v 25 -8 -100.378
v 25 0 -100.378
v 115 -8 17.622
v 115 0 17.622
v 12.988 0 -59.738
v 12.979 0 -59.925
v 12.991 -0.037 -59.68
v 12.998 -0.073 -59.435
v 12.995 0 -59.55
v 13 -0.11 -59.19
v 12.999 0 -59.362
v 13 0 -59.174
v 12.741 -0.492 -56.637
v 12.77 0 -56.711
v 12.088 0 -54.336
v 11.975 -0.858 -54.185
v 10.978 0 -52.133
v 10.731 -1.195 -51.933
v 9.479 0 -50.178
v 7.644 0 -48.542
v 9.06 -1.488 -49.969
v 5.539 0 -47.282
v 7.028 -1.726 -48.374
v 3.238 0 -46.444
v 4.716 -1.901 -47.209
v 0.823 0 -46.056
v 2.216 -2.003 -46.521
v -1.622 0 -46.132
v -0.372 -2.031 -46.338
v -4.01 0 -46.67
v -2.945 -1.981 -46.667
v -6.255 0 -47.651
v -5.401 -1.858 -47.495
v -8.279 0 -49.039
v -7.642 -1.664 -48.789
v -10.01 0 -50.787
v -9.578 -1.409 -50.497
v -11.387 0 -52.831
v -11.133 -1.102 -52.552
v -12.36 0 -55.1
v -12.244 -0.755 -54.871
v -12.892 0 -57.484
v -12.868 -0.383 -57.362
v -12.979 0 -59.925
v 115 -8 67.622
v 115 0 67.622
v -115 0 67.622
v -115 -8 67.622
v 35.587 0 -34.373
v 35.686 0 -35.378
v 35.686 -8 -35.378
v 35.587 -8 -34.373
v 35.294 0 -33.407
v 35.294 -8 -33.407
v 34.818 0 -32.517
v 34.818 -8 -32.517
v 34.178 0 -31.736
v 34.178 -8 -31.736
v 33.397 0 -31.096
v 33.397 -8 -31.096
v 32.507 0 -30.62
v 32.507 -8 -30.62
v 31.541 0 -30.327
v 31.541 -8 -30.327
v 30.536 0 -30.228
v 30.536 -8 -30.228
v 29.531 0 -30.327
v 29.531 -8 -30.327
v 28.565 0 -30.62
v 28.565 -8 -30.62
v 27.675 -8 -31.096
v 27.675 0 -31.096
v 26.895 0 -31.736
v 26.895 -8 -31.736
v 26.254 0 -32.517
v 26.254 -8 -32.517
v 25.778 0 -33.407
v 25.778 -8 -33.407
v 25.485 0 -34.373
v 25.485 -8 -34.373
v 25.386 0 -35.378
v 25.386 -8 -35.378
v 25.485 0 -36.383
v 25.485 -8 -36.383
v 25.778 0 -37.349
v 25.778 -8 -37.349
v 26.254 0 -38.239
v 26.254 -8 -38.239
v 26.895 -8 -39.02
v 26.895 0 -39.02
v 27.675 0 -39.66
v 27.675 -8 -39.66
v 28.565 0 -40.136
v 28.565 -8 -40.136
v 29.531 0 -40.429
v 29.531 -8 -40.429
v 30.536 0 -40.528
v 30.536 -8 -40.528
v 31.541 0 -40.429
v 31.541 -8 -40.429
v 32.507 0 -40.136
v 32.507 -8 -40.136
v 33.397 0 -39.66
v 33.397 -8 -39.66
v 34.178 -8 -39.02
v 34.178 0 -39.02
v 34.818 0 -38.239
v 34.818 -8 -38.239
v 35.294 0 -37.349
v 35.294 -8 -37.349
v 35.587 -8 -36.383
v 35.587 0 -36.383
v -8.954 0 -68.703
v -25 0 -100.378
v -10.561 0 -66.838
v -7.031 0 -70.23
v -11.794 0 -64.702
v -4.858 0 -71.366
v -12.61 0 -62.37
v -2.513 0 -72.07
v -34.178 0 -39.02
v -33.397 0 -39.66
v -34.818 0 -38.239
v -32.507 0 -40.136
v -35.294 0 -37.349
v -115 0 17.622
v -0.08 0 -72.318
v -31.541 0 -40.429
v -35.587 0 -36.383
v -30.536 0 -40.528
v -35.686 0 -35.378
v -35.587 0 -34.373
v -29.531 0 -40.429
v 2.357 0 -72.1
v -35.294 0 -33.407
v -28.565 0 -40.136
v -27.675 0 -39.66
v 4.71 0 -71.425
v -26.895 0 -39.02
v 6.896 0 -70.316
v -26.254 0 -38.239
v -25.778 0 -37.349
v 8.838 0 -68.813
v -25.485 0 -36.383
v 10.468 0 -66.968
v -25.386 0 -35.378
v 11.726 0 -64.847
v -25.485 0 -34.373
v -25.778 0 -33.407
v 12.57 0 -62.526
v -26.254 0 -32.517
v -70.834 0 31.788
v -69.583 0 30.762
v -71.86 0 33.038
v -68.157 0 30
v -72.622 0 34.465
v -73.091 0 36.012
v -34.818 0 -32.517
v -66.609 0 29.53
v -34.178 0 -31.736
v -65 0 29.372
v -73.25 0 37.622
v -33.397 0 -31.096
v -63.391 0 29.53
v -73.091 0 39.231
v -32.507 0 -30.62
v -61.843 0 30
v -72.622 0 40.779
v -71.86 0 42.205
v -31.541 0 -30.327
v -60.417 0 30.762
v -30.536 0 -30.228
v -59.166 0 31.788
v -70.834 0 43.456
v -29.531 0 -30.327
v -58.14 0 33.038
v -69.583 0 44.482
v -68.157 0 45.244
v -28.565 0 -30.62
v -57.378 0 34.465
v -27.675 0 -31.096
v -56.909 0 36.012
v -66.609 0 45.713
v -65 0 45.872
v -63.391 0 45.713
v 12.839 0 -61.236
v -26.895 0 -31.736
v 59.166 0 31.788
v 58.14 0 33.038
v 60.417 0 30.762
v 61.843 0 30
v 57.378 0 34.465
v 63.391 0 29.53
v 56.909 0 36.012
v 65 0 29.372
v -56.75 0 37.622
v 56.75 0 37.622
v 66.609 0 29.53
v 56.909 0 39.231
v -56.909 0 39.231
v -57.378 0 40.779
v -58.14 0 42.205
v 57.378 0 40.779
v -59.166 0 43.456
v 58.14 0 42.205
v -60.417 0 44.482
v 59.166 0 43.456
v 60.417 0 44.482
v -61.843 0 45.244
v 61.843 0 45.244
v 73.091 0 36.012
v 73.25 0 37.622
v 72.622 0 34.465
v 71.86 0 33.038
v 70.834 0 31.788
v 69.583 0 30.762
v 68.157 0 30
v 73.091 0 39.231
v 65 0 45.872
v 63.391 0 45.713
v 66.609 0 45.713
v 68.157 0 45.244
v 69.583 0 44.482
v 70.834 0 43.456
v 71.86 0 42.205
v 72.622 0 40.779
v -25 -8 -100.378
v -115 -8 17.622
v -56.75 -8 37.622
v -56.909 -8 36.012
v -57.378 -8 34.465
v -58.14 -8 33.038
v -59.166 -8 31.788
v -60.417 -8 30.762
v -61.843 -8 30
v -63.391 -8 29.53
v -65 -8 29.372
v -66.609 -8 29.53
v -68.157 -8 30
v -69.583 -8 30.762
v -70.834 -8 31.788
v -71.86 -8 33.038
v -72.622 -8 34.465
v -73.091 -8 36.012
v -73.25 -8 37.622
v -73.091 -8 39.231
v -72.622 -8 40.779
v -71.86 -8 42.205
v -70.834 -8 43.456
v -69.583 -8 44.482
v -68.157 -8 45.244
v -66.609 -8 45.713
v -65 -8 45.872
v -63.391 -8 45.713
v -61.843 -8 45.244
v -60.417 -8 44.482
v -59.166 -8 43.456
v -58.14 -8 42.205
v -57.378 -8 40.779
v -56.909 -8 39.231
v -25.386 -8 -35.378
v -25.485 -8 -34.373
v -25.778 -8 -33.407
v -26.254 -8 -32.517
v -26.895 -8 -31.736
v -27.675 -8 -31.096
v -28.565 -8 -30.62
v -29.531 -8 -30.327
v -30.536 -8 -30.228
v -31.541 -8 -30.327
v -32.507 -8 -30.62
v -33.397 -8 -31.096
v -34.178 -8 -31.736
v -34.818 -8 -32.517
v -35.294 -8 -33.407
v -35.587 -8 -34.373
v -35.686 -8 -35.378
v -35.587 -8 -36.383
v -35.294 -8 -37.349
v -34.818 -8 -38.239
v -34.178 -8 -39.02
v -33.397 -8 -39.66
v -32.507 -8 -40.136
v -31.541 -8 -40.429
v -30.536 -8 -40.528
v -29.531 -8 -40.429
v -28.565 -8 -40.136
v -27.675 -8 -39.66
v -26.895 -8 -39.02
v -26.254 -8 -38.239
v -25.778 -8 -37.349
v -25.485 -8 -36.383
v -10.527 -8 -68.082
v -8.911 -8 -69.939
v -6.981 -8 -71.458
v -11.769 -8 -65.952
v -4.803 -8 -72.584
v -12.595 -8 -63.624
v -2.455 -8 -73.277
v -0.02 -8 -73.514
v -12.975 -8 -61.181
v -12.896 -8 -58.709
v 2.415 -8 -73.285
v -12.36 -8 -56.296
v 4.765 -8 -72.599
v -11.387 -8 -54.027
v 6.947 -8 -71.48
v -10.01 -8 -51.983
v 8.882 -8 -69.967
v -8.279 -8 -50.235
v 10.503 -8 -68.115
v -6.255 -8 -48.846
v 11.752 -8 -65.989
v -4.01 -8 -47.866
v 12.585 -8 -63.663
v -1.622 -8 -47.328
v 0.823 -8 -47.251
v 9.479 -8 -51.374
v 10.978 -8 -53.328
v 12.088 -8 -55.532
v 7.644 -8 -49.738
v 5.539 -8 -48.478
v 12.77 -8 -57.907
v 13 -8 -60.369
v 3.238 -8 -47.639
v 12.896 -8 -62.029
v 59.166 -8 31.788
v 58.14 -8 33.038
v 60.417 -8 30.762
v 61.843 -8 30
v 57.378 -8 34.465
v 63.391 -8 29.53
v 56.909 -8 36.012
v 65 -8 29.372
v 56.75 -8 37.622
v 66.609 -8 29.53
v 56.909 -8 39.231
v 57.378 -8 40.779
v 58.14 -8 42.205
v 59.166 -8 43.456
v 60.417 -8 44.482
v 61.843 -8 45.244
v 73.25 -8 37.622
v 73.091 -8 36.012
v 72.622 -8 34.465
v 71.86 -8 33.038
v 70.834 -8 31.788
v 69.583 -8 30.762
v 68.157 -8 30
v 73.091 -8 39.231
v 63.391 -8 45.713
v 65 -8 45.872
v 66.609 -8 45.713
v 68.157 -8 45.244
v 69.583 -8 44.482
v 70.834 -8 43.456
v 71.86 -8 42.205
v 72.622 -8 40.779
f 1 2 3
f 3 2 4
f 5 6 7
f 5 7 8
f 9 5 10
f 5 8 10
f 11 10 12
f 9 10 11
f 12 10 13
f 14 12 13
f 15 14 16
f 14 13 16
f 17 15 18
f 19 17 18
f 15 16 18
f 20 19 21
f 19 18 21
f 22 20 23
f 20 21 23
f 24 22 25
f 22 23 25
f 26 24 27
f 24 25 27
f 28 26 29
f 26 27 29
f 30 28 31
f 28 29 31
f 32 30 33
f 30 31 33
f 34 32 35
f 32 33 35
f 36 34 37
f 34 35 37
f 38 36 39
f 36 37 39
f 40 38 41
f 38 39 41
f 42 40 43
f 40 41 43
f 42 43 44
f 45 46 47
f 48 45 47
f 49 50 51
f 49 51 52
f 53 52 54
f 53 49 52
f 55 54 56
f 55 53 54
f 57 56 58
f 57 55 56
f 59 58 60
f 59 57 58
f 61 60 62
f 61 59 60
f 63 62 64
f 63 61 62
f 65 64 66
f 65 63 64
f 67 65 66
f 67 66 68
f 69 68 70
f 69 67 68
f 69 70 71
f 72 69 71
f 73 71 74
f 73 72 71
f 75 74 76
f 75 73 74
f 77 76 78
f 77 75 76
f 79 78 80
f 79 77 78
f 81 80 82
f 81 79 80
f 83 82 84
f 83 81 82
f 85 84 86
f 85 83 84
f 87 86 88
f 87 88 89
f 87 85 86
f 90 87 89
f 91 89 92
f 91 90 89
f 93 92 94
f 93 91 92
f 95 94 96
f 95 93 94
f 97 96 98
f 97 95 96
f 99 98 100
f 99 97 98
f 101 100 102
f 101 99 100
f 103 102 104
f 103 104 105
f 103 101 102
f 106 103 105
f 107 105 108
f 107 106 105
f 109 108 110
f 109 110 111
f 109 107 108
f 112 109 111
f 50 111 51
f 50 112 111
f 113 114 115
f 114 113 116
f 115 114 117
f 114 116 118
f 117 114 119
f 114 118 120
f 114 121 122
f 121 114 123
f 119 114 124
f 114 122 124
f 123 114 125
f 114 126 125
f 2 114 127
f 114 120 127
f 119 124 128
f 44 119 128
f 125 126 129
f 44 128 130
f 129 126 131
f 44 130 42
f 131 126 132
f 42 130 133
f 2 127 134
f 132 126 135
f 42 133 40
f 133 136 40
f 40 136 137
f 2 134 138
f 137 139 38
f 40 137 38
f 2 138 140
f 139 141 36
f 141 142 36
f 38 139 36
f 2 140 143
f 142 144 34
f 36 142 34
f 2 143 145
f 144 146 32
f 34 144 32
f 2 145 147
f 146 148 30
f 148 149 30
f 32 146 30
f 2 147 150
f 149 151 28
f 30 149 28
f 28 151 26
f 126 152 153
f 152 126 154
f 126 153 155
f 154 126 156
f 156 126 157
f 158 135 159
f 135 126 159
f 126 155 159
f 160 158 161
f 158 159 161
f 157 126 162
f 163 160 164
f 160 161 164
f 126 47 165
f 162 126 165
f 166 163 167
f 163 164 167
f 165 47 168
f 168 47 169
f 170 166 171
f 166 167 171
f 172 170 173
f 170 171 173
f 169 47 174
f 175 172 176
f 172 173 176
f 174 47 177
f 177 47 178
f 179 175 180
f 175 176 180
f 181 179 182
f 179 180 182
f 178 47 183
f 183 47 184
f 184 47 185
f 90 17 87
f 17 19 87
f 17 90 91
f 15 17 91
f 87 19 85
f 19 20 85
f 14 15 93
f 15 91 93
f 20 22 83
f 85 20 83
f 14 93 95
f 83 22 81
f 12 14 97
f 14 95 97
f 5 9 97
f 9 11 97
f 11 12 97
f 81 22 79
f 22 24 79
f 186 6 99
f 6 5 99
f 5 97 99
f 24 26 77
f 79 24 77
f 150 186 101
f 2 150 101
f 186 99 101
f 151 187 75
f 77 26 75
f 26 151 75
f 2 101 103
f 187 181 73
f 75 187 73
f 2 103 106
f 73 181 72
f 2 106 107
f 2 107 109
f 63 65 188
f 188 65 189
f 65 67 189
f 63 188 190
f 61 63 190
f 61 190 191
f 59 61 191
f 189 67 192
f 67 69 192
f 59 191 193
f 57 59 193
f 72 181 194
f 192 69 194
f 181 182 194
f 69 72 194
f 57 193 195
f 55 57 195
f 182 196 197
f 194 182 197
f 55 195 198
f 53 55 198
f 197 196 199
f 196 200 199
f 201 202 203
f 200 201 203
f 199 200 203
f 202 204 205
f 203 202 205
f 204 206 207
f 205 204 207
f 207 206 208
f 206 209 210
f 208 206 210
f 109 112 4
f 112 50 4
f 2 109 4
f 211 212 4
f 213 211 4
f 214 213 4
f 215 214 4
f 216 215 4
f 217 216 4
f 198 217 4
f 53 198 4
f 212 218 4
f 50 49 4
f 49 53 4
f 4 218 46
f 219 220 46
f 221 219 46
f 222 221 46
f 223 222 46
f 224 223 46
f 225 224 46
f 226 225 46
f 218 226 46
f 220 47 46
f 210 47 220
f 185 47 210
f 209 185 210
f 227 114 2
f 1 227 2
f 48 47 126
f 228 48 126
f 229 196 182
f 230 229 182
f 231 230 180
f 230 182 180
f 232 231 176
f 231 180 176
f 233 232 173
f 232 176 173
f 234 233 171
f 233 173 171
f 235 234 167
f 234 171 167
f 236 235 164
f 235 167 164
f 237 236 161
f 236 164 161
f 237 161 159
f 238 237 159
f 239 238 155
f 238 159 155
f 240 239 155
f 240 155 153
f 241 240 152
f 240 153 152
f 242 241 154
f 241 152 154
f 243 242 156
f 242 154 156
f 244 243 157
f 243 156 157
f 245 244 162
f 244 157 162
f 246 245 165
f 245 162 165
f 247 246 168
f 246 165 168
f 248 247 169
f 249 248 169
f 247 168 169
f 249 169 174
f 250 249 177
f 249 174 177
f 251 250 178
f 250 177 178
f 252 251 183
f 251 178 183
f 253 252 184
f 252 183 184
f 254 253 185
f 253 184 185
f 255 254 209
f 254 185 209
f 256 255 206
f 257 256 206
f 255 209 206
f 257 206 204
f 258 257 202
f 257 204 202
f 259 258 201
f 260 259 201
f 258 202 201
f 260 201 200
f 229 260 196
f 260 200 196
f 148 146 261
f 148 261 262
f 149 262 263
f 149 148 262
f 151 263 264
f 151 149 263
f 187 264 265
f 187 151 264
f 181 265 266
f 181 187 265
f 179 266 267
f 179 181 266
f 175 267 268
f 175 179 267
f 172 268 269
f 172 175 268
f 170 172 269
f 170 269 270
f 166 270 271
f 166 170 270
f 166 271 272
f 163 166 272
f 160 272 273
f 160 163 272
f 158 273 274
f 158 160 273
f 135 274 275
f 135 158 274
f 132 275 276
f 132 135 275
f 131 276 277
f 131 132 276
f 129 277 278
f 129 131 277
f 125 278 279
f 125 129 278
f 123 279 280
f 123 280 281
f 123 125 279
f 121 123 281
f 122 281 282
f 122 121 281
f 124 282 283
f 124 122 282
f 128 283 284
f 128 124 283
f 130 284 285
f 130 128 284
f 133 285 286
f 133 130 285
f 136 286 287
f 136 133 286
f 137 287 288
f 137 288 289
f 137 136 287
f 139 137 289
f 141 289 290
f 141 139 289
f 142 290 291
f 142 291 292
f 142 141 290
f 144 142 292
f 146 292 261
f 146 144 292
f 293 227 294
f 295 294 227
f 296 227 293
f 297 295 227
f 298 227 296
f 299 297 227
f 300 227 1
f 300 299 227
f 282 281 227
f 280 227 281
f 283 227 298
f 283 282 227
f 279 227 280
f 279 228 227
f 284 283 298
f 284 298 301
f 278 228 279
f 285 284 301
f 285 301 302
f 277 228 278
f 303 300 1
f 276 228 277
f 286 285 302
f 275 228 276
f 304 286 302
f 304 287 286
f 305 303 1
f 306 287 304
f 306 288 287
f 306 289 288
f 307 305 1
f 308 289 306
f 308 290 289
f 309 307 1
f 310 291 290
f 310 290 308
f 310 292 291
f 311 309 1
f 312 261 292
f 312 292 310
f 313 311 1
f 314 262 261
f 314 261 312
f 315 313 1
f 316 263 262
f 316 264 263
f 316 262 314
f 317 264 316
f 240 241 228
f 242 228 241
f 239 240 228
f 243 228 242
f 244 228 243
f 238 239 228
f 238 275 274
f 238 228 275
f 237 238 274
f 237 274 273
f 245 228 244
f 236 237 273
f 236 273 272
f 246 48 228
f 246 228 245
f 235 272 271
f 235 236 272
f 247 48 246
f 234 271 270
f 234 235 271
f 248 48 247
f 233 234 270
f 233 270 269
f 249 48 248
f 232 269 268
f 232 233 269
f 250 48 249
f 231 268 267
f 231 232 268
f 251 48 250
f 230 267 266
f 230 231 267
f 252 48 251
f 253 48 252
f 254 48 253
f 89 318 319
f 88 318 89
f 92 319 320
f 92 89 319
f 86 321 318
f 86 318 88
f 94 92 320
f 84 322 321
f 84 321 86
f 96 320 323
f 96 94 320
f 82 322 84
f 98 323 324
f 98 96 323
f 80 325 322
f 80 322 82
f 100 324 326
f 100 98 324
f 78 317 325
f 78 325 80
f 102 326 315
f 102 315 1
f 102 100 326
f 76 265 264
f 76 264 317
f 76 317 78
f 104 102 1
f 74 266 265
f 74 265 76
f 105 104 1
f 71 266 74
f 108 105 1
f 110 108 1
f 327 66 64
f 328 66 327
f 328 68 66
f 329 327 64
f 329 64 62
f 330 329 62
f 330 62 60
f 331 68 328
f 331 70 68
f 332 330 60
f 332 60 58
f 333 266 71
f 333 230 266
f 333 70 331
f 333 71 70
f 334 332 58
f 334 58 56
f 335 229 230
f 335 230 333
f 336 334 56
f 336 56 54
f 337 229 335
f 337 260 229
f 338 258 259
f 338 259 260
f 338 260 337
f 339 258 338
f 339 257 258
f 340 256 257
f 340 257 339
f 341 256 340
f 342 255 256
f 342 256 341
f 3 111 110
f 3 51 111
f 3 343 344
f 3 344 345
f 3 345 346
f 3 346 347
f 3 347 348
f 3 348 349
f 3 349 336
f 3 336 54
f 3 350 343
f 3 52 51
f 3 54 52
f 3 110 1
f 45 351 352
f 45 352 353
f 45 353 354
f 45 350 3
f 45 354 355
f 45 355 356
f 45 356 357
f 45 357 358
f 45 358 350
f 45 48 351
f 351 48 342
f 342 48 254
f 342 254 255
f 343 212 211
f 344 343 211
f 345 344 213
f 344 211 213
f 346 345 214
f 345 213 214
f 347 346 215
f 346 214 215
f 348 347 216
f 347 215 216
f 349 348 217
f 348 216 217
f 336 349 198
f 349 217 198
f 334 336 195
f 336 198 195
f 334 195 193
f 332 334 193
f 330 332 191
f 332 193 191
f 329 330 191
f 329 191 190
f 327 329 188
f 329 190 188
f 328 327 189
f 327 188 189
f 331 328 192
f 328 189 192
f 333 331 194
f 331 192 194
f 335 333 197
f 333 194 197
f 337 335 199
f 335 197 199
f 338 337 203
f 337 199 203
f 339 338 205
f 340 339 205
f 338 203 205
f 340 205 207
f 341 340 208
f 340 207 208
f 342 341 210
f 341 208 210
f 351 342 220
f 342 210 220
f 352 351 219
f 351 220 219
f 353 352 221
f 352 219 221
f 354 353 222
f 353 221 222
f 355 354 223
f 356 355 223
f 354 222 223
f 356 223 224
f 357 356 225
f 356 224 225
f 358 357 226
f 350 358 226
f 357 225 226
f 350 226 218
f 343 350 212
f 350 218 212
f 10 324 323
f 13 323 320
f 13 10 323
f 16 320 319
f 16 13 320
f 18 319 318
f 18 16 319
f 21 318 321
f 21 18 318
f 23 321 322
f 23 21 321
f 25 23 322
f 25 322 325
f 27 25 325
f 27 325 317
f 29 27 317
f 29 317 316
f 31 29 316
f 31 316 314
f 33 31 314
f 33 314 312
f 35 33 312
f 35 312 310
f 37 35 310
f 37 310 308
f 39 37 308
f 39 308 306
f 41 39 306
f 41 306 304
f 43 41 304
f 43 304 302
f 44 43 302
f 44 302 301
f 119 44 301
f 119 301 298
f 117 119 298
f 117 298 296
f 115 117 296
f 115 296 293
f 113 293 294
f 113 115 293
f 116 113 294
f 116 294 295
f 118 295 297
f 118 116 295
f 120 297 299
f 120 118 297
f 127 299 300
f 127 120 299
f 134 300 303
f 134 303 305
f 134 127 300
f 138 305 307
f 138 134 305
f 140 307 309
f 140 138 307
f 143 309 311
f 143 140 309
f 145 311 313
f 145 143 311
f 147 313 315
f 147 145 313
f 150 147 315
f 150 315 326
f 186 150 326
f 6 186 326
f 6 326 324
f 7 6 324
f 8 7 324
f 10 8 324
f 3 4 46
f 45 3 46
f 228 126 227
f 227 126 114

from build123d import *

# Parameters (mm, degrees)
F0_R     = 5.15
F0_R_2   = 13
F1_DEPTH = 8
F3_R     = 13
F4_DEPTH = 230
F5_DEPTH = 25


with BuildPart() as f1:
    # F0 (on Front) → F1 (new body)
    with BuildSketch(Plane.XZ):
        with BuildLine():
            Line((115, 67.621908), (0, 67.621908))
            Line((0, 67.621908), (-115, 67.621908))
            Line((-115, 67.621908), (-115, 37.621908))
            Line((-115, 37.621908), (-73.25, 37.621908))
            ThreePointArc((-73.25, 37.621908), (-65, 45.871908), (-56.75, 37.621908))
            Line((-56.75, 37.621908), (56.75, 37.621908))
            ThreePointArc((56.75, 37.621908), (65, 45.871908), (73.25, 37.621908))
            Line((73.25, 37.621908), (115, 37.621908))
            Line((115, 37.621908), (115, 67.621908))
        make_face()
        with BuildLine():
            Line((-73.25, 37.621908), (-115, 37.621908))
            Line((-115, 37.621908), (-115, 17.621908))
            Line((-115, 17.621908), (-25, -100.378092))
            Line((-25, -100.378092), (0, -100.378092))
            Line((0, -100.378092), (25, -100.378092))
            Line((25, -100.378092), (115, 17.621908))
            Line((115, 17.621908), (115, 37.621908))
            Line((115, 37.621908), (73.25, 37.621908))
            ThreePointArc((73.25, 37.621908), (65, 29.371908), (56.75, 37.621908))
            Line((56.75, 37.621908), (-56.75, 37.621908))
            ThreePointArc((-56.75, 37.621908), (-65, 29.371908), (-73.25, 37.621908))
        make_face()
        with Locations((-30.536113, -35.378092)):
            Circle(F0_R, mode=Mode.SUBTRACT)
        with Locations((0, -59.925269)):
            Circle(F0_R_2, mode=Mode.SUBTRACT)
        with Locations((30.536113, -35.378092)):
            Circle(F0_R, mode=Mode.SUBTRACT)
        with Locations((0, -59.925269)):
            Circle(F0_R_2)
    extrude(amount=F1_DEPTH)

    # F3 (on face) → F4 (cut)
    with BuildSketch(Plane(origin=(0, -8.760227, -1.309225), x_dir=(1, 0, 0), z_dir=(0, -0.989016, -0.147809))):
        with Locations((0, -58.5236)):
            Circle(F3_R)
    extrude(amount=F4_DEPTH, mode=Mode.SUBTRACT)

    # F3 (on face) → F5 (cut)
    with BuildSketch(Plane(origin=(0, -8.760227, -1.309225), x_dir=(1, 0, 0), z_dir=(0, -0.989016, -0.147809))):
        with Locations((0, -58.5236)):
            Circle(F3_R)
    extrude(amount=-F5_DEPTH, mode=Mode.SUBTRACT)


solid = f1.part
